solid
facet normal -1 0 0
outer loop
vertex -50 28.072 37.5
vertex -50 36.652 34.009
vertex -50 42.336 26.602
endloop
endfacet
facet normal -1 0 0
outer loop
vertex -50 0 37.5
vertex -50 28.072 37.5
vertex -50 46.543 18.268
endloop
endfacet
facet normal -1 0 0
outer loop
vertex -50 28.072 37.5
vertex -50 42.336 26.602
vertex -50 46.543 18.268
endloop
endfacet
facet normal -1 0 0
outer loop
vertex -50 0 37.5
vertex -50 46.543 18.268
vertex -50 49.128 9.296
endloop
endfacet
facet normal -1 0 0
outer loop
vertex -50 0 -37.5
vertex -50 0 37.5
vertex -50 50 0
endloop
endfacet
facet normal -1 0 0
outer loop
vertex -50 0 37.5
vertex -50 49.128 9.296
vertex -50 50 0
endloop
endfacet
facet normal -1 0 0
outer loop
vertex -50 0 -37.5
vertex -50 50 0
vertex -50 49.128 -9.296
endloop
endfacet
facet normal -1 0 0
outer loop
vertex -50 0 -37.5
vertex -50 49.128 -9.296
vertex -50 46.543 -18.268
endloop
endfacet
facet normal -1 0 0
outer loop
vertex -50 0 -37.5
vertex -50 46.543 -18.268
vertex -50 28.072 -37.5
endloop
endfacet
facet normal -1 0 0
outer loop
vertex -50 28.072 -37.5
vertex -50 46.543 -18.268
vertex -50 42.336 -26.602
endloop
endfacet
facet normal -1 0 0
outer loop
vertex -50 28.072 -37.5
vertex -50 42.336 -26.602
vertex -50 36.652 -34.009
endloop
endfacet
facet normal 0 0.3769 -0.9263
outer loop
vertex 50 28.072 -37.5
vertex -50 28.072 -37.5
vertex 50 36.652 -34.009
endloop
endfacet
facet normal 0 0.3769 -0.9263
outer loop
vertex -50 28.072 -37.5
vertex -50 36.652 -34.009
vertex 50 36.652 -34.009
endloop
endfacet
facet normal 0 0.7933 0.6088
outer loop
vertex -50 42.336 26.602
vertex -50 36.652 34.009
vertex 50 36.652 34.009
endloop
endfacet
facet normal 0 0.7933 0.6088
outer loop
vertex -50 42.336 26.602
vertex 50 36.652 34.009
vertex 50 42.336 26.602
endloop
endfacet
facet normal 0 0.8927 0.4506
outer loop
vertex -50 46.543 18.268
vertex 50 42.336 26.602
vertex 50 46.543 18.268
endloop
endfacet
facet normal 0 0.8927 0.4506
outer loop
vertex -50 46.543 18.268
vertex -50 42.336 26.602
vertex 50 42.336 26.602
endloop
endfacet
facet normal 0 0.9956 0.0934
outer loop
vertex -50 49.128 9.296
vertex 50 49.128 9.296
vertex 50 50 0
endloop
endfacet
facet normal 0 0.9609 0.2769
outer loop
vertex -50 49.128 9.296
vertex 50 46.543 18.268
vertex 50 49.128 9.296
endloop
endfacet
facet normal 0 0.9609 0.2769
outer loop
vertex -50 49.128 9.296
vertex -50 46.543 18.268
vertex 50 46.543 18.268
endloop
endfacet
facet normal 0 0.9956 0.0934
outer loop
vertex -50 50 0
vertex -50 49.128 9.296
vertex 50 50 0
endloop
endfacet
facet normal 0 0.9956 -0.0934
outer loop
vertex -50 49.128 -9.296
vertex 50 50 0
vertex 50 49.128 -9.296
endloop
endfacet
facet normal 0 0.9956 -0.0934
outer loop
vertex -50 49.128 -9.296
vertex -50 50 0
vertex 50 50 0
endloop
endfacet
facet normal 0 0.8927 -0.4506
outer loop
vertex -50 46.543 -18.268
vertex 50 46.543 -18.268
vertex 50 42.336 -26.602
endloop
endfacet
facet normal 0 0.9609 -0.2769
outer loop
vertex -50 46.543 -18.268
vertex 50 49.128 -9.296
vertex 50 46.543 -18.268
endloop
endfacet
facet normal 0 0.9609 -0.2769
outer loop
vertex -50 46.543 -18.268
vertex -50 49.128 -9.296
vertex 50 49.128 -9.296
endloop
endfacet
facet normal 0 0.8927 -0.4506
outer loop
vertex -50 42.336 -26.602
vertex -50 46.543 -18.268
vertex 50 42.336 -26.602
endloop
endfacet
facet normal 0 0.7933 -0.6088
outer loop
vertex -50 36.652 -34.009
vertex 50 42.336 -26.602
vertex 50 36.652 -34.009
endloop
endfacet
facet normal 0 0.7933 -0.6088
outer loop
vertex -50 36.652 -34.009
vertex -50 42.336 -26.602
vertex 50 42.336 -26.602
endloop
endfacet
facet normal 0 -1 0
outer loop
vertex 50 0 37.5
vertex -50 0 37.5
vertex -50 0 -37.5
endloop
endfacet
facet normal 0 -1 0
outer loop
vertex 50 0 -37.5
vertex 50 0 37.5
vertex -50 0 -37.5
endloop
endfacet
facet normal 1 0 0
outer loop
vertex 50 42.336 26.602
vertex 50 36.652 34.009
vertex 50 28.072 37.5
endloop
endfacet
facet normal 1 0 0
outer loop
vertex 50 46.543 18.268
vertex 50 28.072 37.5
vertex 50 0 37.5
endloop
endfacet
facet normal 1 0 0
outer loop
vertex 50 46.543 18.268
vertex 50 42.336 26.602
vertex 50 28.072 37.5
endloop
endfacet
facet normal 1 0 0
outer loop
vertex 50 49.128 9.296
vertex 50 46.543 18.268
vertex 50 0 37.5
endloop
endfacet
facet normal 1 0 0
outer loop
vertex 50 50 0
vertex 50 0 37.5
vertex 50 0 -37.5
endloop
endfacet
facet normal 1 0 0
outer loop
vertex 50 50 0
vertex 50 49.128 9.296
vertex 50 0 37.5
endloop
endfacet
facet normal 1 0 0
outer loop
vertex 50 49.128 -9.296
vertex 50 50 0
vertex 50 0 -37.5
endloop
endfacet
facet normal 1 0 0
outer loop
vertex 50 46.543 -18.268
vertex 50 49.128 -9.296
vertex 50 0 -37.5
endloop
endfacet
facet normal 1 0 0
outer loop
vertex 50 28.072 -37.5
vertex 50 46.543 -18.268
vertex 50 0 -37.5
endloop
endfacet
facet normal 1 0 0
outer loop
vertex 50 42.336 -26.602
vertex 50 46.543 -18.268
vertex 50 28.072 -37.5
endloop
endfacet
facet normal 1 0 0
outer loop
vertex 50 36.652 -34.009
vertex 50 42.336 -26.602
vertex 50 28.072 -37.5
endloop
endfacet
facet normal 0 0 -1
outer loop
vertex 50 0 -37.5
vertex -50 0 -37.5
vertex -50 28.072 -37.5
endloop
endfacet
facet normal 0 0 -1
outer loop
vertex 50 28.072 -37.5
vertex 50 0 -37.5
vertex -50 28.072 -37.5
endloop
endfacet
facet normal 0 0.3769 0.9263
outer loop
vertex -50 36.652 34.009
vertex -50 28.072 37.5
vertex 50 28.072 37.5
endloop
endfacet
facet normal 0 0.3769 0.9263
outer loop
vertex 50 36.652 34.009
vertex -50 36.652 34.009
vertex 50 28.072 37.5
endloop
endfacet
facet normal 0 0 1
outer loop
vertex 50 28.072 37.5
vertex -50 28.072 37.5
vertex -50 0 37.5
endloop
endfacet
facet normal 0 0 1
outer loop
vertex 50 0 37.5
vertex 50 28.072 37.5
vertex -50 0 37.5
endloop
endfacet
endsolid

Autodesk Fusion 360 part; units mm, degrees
sketch "Sketch1" plane through (0, 0, 0) normal (1, 0, 0) x (0, 0, -1)
  arc A0 (37.5, 33.0719) -> (-37.5, 33.0719) centre (0, 0) ccw
  line L0 (-37.5, 33.0719) -> (-37.5, 0)
  line L1 (-37.5, 0) -> (37.5, 0)
  line L2 (37.5, 0) -> (37.5, 33.0719)
  dimension "d1" = 50
  dimension "d2" = 75
extrude "Extrude1" add sketch "Sketch1" along normal mid plane 100
chamfer "Chamfer1" distance 5 angle 45 2 edges at (0, 33.0719, 37.5) (0, 33.0719, -37.5)
